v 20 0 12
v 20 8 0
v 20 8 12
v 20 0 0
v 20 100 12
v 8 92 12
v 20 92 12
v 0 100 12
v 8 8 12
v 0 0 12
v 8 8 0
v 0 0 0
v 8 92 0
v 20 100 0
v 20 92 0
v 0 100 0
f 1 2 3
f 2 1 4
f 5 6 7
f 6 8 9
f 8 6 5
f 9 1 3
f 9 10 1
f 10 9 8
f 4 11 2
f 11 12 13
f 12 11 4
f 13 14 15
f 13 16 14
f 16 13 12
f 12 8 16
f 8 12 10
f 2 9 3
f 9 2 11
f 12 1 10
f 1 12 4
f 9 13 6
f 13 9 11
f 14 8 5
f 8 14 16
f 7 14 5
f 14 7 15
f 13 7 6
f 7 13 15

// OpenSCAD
l1=100;
l2=20;
w=8;
h=12;

cube([l2, 8, h]);
cube([w, l1, h]);
translate([0, l1-w, 0]) cube([l2, w, h]);
